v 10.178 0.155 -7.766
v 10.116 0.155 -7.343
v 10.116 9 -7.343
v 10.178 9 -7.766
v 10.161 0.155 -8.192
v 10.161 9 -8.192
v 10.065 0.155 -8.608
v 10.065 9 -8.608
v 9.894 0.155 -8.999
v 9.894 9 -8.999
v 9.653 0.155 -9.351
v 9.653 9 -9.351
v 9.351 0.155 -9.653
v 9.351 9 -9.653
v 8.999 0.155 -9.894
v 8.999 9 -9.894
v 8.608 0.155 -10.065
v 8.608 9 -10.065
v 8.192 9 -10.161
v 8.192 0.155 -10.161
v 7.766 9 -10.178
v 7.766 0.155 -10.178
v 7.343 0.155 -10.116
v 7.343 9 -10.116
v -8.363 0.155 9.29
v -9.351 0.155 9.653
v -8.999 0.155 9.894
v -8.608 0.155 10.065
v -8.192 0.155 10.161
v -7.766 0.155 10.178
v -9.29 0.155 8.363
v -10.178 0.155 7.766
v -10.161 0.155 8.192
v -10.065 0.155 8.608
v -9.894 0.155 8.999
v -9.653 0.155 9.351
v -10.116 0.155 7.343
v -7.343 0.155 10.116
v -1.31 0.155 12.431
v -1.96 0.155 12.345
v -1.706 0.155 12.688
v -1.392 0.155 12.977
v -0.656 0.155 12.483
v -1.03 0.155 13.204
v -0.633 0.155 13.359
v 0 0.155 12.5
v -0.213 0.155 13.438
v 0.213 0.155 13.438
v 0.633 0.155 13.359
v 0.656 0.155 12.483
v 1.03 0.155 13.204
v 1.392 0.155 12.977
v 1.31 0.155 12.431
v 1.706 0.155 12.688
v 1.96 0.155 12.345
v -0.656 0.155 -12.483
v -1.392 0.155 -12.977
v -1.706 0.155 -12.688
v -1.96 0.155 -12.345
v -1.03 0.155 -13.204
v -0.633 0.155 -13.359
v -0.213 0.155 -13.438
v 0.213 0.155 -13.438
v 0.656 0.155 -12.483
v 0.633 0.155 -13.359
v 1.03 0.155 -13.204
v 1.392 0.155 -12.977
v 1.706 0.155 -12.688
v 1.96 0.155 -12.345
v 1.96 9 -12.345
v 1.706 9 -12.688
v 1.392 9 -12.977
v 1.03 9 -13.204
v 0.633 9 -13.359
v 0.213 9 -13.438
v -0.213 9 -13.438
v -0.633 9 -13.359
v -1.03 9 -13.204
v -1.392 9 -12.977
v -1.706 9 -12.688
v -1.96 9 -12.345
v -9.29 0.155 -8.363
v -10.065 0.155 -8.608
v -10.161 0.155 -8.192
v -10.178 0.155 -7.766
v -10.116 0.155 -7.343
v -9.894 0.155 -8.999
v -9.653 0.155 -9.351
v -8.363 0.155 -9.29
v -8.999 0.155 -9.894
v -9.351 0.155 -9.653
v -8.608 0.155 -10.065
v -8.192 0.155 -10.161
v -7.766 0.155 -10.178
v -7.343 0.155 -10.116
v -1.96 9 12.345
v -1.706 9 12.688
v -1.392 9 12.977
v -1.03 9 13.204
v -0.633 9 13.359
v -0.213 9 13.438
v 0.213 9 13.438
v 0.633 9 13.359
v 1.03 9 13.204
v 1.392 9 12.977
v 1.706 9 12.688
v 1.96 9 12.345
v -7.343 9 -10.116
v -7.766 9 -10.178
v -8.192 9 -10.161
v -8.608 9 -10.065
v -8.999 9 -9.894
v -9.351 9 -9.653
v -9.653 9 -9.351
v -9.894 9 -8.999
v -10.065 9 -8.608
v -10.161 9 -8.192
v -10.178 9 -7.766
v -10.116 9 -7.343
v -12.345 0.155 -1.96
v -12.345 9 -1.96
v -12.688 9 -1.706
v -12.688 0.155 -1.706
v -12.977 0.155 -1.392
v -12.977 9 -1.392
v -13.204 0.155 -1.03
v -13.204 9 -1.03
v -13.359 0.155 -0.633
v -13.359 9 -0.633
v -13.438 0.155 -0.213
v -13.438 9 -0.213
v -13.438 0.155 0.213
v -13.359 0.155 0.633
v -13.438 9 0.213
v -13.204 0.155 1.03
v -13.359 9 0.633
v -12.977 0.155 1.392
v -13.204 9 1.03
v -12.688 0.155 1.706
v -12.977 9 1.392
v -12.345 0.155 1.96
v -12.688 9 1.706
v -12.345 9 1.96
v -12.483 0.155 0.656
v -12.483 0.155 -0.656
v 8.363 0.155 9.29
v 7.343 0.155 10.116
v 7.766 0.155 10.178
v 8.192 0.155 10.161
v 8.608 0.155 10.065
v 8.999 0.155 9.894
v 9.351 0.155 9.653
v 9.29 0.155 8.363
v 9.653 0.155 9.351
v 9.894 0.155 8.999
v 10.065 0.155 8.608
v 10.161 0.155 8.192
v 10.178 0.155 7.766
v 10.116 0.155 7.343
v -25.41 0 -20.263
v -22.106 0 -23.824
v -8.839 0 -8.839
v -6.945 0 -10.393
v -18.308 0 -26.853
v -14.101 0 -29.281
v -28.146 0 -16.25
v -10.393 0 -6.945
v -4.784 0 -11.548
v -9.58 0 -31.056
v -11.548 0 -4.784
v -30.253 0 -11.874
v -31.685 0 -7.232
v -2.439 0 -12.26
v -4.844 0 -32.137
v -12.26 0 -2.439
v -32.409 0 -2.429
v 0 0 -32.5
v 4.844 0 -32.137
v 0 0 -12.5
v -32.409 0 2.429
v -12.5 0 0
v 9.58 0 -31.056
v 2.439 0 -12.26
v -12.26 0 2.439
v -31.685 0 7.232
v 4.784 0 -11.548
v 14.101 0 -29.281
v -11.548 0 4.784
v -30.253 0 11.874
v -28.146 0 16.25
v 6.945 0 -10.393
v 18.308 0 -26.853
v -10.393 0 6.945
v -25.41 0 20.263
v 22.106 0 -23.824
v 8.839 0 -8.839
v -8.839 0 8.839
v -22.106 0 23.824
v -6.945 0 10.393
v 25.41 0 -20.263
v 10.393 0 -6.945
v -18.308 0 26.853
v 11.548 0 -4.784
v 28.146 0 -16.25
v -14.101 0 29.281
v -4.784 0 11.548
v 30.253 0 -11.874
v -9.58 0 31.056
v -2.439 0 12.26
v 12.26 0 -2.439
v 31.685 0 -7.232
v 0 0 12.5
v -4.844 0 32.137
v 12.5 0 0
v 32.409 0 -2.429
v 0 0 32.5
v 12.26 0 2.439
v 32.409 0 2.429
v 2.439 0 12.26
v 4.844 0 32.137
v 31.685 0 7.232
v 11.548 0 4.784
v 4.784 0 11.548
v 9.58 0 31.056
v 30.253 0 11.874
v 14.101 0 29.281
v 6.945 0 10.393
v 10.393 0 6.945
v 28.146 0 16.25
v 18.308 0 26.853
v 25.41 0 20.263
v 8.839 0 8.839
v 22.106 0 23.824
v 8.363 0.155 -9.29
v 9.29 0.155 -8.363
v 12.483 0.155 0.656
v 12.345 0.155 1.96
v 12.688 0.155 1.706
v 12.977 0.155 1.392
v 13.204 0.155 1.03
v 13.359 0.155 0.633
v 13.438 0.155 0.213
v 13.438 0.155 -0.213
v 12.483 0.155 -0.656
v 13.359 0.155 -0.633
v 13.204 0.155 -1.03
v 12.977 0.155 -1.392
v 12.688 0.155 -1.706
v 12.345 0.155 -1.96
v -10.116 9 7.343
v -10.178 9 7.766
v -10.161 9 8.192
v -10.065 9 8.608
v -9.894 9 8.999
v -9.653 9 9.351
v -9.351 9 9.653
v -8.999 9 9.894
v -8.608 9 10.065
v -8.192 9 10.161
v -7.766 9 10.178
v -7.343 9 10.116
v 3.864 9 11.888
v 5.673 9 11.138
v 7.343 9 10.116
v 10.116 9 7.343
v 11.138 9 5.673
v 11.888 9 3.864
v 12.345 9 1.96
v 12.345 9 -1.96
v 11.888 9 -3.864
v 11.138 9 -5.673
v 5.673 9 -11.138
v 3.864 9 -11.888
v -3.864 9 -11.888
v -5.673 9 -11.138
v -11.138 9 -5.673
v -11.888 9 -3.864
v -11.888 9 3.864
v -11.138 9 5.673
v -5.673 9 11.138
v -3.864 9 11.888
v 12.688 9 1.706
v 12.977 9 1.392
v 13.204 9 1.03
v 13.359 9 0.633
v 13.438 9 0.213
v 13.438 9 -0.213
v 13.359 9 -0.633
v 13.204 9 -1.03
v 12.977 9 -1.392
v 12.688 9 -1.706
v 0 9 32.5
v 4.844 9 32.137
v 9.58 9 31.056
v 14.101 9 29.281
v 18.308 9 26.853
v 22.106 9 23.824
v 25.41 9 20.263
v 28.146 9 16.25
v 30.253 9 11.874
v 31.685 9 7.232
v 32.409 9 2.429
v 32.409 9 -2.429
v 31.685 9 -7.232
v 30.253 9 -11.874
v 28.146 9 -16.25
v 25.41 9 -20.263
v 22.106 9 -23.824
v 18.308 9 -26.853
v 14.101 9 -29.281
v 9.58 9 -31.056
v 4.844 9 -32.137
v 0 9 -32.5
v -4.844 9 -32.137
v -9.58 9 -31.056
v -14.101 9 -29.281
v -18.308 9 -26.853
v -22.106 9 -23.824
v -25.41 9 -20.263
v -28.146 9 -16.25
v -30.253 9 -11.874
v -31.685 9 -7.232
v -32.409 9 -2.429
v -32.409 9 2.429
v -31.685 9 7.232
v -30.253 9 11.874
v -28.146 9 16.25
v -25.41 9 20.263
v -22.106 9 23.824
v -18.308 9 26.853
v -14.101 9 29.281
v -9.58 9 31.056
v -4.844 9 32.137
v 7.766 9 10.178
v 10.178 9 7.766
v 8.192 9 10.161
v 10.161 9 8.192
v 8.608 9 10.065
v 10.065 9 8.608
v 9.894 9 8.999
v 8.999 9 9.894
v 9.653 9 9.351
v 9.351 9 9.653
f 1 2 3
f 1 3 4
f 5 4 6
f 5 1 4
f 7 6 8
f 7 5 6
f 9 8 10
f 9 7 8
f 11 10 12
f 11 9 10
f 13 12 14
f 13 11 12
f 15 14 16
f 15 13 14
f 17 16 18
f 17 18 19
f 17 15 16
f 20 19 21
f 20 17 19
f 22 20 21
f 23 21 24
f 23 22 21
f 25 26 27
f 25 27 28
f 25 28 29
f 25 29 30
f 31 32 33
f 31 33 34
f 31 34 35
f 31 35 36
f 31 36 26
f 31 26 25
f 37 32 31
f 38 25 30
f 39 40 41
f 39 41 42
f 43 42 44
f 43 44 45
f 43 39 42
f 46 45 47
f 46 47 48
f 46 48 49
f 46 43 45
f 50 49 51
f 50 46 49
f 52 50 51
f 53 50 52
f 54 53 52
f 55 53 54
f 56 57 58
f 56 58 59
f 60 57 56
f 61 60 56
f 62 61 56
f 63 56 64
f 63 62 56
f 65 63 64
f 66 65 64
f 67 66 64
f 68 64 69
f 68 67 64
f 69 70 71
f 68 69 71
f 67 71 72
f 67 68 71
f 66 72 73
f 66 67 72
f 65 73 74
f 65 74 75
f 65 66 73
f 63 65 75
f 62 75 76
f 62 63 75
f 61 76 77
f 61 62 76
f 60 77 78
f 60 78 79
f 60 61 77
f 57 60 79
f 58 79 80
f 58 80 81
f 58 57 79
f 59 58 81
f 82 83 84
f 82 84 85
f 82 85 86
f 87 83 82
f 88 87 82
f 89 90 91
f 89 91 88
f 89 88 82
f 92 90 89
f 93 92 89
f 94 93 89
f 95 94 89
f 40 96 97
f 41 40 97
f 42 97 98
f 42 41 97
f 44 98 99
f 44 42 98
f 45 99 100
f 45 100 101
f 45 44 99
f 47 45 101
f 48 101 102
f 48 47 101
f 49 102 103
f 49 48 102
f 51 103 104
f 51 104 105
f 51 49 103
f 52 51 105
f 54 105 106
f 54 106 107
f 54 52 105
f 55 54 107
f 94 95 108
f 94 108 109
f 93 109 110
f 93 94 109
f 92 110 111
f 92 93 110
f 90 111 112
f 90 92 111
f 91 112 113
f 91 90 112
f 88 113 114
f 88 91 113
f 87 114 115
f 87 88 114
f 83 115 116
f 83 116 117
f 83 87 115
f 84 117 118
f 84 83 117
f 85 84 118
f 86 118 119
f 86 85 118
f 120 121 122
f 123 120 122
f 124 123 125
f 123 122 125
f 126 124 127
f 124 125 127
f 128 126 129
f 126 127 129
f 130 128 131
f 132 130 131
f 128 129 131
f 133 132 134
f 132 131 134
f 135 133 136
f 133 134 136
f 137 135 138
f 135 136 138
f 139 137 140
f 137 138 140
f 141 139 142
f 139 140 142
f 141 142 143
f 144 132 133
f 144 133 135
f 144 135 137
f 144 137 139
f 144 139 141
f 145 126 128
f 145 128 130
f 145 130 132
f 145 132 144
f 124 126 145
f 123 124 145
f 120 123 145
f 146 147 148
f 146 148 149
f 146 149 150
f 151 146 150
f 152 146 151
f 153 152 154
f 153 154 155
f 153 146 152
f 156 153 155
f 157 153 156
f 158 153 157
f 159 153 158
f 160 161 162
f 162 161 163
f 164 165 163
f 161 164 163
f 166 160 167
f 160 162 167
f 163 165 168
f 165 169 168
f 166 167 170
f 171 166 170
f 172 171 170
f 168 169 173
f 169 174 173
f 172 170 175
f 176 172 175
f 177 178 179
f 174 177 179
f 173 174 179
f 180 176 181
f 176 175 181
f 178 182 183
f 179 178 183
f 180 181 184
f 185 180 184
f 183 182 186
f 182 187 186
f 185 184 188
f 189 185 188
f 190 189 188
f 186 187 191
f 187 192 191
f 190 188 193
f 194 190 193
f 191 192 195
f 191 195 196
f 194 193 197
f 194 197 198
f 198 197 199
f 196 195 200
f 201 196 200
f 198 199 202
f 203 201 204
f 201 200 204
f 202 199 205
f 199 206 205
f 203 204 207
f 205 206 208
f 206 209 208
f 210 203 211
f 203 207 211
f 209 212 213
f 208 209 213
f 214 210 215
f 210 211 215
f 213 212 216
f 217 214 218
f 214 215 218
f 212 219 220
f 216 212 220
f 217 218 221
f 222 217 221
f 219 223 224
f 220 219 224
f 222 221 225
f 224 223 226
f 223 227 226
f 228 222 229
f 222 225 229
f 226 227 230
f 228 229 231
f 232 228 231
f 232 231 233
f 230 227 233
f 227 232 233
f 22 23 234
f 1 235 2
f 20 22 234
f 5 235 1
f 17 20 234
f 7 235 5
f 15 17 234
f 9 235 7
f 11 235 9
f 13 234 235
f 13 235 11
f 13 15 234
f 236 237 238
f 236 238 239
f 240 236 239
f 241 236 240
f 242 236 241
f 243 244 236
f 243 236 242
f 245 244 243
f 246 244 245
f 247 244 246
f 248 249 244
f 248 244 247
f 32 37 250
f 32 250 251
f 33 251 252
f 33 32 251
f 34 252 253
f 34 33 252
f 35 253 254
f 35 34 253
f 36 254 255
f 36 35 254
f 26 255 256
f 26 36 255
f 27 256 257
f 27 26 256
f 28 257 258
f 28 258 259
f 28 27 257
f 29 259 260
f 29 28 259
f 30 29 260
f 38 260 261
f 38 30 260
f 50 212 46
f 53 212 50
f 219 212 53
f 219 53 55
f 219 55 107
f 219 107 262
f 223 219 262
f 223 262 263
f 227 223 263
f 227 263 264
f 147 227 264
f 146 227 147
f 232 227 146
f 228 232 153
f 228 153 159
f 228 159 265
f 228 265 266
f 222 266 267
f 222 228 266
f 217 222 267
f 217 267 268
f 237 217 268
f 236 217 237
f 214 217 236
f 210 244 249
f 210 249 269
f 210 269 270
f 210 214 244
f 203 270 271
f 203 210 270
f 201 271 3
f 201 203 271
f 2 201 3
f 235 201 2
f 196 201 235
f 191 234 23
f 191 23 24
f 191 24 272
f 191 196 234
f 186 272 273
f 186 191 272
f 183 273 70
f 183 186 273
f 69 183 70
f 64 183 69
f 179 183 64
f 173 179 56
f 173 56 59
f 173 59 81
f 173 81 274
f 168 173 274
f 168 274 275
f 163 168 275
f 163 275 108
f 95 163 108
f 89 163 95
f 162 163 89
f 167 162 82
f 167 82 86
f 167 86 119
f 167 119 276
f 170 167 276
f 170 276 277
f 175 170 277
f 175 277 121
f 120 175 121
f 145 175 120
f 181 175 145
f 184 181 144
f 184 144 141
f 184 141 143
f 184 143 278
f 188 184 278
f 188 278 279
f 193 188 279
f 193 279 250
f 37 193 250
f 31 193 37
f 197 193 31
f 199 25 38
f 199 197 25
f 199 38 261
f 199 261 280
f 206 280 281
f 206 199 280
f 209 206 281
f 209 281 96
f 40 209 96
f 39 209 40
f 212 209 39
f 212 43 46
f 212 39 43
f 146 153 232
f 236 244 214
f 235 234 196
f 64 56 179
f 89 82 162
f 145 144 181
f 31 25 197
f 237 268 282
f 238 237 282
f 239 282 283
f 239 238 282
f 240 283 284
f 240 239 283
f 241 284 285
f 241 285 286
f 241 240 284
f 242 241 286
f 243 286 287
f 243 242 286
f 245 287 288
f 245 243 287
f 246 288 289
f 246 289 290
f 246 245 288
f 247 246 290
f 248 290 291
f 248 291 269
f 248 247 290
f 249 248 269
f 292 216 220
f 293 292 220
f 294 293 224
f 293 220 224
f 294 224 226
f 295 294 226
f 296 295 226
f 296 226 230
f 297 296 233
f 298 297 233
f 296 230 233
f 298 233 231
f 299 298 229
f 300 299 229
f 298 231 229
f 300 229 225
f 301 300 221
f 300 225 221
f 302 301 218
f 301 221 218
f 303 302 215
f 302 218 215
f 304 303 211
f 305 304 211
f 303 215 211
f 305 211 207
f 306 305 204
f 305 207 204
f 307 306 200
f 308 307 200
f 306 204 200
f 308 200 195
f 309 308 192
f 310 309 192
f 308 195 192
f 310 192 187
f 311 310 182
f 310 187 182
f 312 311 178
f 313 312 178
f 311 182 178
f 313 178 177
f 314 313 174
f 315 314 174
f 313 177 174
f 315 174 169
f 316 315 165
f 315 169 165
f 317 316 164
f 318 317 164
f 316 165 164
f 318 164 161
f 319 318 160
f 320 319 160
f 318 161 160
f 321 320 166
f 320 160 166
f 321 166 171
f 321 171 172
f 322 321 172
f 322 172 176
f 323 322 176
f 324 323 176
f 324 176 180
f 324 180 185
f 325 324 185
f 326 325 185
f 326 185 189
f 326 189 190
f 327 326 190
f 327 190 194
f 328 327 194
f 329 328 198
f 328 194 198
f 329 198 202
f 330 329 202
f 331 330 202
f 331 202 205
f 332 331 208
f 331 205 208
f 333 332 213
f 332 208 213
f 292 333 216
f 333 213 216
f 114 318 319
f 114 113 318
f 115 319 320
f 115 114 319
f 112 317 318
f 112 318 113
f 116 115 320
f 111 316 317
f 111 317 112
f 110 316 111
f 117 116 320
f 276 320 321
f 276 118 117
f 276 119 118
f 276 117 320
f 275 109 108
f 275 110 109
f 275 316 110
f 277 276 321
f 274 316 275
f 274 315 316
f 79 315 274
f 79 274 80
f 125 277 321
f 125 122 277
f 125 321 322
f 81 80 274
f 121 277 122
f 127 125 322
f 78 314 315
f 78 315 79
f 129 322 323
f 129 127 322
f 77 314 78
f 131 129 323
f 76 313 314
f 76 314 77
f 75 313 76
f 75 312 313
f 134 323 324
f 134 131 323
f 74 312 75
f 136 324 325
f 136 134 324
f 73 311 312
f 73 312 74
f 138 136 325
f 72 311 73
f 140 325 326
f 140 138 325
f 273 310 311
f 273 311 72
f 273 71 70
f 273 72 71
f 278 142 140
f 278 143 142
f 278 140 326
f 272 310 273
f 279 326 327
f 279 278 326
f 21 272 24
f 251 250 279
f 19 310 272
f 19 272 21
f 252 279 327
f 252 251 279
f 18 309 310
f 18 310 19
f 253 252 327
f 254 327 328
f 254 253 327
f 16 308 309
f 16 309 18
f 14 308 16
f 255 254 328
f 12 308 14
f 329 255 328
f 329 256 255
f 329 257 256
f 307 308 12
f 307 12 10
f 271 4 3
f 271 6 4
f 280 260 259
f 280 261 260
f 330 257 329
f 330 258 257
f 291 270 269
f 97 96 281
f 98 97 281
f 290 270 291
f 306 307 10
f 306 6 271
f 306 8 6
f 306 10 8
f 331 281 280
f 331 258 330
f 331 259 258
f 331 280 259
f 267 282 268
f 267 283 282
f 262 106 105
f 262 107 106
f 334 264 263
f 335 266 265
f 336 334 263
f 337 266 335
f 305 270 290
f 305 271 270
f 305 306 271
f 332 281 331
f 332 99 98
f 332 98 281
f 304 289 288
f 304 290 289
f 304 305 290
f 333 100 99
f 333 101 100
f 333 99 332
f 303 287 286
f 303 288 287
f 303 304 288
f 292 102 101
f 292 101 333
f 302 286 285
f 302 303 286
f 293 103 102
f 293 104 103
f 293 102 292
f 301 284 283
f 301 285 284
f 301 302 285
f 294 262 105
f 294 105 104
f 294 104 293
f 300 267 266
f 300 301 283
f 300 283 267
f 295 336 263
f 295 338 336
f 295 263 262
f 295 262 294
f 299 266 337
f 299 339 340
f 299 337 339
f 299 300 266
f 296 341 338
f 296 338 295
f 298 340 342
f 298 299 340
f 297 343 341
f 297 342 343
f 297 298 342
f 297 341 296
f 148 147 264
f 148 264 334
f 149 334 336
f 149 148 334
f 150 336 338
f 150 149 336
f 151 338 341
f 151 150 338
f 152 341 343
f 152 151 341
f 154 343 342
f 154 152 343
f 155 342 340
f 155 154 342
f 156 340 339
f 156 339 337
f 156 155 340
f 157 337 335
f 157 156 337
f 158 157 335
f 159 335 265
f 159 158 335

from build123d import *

# Parameters (mm, degrees)
SKETCH1_R           = 32.5
BOSS_EXTRUDE1_DEPTH = 9
SKETCH2_R           = 12.5
CUT_EXTRUDE1_DEPTH  = 47.834816109
SKETCH3_R           = 2.293323558
CUT_EXTRUDE2_DEPTH  = 8.845206288
CIRPATTERN1_COUNT   = 8


with BuildPart() as part:
    # Sketch1 → Boss-Extrude1 (new body)
    with BuildSketch(Plane(origin=(0, 0, 0), x_dir=(1, 0, 0), z_dir=(0, 1, 0))):
        Circle(SKETCH1_R)
    extrude(amount=BOSS_EXTRUDE1_DEPTH)

    # Sketch2 → Cut-Extrude1 (cut, through all)
    with BuildSketch(Plane(origin=(0, 0, 0), x_dir=(1, 0, 0), z_dir=(0, 1, 0))):
        Circle(SKETCH2_R)
    extrude(amount=CUT_EXTRUDE1_DEPTH, mode=Mode.SUBTRACT)

    # Sketch3 → Cut-Extrude2 (cut)
    with BuildSketch(Plane(origin=(0, 9, 0), x_dir=(1, 0, 0), z_dir=(0, 1, 0))):
        with Locations((-11.154965368, 0)):
            Circle(SKETCH3_R)
    cut_extrude2 = extrude(amount=-CUT_EXTRUDE2_DEPTH, mode=Mode.SUBTRACT)

    # CirPattern1: Cut-Extrude2 ×8 about axis
    cirpattern1_axis = Axis((0, 0, 0), (0, 1, 0))
    for i in range(1, CIRPATTERN1_COUNT):
        add(cut_extrude2.rotate(cirpattern1_axis, i * 360 / CIRPATTERN1_COUNT), mode=Mode.SUBTRACT)


solid = part.part
